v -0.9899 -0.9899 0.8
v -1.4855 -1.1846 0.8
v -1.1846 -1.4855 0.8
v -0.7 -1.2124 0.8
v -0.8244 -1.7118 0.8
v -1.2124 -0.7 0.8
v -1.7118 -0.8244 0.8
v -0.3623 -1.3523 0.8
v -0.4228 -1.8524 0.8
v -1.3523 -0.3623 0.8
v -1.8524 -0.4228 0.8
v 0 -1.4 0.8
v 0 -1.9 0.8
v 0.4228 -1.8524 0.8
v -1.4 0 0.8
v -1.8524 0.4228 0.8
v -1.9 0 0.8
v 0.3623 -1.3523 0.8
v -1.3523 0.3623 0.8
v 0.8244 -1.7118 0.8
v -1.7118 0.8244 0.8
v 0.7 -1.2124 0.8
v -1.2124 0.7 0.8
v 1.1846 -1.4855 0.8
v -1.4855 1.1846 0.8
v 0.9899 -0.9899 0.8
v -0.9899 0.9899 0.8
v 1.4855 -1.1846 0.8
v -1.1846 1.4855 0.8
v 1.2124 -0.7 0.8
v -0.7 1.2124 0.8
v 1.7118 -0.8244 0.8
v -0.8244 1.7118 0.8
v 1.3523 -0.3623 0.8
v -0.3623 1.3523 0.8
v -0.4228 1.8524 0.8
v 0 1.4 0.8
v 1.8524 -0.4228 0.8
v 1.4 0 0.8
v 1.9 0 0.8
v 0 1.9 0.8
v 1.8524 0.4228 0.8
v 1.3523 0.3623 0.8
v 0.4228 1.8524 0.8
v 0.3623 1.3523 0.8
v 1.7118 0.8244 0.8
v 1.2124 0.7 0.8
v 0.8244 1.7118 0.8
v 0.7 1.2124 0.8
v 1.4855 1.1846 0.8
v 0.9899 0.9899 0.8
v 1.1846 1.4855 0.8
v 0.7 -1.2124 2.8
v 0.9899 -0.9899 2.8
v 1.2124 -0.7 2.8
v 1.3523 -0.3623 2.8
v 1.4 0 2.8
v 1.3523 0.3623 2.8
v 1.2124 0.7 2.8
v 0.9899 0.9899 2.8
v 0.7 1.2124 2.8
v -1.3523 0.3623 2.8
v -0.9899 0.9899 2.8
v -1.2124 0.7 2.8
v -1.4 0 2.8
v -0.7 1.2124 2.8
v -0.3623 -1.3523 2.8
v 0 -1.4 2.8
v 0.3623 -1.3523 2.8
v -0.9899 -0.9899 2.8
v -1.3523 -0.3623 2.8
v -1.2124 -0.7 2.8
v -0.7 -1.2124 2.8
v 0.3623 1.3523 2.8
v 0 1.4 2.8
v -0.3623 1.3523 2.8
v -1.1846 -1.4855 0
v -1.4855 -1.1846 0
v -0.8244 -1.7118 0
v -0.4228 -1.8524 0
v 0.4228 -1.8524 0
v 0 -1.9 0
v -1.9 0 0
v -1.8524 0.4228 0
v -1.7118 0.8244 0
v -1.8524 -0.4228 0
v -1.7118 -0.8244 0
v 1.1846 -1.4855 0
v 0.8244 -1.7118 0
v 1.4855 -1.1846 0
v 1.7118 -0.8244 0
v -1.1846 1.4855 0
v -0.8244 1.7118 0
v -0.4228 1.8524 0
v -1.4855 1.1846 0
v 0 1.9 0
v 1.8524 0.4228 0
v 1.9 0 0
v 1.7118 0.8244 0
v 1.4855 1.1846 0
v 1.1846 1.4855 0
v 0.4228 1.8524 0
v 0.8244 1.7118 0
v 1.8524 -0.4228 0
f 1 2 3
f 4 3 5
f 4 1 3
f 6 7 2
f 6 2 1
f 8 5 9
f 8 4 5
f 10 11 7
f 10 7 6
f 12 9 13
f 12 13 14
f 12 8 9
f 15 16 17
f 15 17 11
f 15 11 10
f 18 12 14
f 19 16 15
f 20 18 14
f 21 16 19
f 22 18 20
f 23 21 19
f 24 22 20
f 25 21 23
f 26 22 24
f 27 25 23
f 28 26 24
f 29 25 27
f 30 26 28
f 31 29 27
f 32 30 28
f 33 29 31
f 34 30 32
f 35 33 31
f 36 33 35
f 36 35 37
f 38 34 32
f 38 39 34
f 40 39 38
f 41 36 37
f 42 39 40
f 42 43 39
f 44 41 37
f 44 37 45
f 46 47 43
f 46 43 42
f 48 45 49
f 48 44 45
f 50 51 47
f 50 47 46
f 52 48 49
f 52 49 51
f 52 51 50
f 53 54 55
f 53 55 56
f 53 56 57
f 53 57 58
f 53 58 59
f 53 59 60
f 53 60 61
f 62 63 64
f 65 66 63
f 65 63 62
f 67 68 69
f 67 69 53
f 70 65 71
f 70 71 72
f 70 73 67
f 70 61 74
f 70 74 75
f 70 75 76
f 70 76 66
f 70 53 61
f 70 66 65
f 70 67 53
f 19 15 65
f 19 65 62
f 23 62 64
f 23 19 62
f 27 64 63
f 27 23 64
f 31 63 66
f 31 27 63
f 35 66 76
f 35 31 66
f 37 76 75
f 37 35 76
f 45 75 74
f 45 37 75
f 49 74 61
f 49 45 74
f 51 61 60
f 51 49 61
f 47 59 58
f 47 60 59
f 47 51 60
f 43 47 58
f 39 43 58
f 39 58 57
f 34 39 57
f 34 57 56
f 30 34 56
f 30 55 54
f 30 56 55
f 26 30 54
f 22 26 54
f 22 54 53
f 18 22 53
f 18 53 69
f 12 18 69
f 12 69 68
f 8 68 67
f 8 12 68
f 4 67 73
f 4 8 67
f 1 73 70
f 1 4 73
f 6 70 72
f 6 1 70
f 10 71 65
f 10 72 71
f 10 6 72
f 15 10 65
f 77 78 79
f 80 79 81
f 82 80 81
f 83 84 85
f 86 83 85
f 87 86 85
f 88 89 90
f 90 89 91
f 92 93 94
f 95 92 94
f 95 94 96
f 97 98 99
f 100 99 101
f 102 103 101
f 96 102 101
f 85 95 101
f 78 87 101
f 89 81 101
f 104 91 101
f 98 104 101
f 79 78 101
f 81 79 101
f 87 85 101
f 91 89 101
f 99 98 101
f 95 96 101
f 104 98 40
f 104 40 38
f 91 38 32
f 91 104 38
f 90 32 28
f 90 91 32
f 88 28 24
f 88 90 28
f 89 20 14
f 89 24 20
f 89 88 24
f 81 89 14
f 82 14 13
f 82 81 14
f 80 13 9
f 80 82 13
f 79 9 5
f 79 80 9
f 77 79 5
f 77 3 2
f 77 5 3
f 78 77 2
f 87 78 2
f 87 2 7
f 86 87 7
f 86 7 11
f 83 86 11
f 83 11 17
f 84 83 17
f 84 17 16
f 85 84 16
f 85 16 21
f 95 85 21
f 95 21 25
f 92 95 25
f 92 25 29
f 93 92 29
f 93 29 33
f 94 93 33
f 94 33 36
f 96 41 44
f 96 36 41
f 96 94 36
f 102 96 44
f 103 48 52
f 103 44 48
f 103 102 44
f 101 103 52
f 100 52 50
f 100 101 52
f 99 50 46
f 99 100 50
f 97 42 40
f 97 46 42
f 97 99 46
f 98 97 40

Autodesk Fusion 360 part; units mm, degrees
sketch "Sketch1" plane through (0, 0, 0) normal (0, 0, 1) x (1, 0, 0)
  circle A0 centre (0, 0) radius 1.9
  dimension "d1" = 3.8
extrude "Extrude1" add sketch "Sketch1" along normal blind 0.8
sketch "Sketch2" plane through (0, 0, 0.8) normal (0, 0, 1) x (-1, 0, 0)
  circle A0 centre (0, 0) radius 1.9
  circle A1 centre (0, 0) radius 1.4
  dimension "d4" = 2.8
extrude "Extrude2" add sketch "Sketch2" along normal blind 1 contours A1
extrude "Extrude3" add 1 faces at (-0.5498, 0.3174, 1.8) along direction (0, 0, 1) blind 1
